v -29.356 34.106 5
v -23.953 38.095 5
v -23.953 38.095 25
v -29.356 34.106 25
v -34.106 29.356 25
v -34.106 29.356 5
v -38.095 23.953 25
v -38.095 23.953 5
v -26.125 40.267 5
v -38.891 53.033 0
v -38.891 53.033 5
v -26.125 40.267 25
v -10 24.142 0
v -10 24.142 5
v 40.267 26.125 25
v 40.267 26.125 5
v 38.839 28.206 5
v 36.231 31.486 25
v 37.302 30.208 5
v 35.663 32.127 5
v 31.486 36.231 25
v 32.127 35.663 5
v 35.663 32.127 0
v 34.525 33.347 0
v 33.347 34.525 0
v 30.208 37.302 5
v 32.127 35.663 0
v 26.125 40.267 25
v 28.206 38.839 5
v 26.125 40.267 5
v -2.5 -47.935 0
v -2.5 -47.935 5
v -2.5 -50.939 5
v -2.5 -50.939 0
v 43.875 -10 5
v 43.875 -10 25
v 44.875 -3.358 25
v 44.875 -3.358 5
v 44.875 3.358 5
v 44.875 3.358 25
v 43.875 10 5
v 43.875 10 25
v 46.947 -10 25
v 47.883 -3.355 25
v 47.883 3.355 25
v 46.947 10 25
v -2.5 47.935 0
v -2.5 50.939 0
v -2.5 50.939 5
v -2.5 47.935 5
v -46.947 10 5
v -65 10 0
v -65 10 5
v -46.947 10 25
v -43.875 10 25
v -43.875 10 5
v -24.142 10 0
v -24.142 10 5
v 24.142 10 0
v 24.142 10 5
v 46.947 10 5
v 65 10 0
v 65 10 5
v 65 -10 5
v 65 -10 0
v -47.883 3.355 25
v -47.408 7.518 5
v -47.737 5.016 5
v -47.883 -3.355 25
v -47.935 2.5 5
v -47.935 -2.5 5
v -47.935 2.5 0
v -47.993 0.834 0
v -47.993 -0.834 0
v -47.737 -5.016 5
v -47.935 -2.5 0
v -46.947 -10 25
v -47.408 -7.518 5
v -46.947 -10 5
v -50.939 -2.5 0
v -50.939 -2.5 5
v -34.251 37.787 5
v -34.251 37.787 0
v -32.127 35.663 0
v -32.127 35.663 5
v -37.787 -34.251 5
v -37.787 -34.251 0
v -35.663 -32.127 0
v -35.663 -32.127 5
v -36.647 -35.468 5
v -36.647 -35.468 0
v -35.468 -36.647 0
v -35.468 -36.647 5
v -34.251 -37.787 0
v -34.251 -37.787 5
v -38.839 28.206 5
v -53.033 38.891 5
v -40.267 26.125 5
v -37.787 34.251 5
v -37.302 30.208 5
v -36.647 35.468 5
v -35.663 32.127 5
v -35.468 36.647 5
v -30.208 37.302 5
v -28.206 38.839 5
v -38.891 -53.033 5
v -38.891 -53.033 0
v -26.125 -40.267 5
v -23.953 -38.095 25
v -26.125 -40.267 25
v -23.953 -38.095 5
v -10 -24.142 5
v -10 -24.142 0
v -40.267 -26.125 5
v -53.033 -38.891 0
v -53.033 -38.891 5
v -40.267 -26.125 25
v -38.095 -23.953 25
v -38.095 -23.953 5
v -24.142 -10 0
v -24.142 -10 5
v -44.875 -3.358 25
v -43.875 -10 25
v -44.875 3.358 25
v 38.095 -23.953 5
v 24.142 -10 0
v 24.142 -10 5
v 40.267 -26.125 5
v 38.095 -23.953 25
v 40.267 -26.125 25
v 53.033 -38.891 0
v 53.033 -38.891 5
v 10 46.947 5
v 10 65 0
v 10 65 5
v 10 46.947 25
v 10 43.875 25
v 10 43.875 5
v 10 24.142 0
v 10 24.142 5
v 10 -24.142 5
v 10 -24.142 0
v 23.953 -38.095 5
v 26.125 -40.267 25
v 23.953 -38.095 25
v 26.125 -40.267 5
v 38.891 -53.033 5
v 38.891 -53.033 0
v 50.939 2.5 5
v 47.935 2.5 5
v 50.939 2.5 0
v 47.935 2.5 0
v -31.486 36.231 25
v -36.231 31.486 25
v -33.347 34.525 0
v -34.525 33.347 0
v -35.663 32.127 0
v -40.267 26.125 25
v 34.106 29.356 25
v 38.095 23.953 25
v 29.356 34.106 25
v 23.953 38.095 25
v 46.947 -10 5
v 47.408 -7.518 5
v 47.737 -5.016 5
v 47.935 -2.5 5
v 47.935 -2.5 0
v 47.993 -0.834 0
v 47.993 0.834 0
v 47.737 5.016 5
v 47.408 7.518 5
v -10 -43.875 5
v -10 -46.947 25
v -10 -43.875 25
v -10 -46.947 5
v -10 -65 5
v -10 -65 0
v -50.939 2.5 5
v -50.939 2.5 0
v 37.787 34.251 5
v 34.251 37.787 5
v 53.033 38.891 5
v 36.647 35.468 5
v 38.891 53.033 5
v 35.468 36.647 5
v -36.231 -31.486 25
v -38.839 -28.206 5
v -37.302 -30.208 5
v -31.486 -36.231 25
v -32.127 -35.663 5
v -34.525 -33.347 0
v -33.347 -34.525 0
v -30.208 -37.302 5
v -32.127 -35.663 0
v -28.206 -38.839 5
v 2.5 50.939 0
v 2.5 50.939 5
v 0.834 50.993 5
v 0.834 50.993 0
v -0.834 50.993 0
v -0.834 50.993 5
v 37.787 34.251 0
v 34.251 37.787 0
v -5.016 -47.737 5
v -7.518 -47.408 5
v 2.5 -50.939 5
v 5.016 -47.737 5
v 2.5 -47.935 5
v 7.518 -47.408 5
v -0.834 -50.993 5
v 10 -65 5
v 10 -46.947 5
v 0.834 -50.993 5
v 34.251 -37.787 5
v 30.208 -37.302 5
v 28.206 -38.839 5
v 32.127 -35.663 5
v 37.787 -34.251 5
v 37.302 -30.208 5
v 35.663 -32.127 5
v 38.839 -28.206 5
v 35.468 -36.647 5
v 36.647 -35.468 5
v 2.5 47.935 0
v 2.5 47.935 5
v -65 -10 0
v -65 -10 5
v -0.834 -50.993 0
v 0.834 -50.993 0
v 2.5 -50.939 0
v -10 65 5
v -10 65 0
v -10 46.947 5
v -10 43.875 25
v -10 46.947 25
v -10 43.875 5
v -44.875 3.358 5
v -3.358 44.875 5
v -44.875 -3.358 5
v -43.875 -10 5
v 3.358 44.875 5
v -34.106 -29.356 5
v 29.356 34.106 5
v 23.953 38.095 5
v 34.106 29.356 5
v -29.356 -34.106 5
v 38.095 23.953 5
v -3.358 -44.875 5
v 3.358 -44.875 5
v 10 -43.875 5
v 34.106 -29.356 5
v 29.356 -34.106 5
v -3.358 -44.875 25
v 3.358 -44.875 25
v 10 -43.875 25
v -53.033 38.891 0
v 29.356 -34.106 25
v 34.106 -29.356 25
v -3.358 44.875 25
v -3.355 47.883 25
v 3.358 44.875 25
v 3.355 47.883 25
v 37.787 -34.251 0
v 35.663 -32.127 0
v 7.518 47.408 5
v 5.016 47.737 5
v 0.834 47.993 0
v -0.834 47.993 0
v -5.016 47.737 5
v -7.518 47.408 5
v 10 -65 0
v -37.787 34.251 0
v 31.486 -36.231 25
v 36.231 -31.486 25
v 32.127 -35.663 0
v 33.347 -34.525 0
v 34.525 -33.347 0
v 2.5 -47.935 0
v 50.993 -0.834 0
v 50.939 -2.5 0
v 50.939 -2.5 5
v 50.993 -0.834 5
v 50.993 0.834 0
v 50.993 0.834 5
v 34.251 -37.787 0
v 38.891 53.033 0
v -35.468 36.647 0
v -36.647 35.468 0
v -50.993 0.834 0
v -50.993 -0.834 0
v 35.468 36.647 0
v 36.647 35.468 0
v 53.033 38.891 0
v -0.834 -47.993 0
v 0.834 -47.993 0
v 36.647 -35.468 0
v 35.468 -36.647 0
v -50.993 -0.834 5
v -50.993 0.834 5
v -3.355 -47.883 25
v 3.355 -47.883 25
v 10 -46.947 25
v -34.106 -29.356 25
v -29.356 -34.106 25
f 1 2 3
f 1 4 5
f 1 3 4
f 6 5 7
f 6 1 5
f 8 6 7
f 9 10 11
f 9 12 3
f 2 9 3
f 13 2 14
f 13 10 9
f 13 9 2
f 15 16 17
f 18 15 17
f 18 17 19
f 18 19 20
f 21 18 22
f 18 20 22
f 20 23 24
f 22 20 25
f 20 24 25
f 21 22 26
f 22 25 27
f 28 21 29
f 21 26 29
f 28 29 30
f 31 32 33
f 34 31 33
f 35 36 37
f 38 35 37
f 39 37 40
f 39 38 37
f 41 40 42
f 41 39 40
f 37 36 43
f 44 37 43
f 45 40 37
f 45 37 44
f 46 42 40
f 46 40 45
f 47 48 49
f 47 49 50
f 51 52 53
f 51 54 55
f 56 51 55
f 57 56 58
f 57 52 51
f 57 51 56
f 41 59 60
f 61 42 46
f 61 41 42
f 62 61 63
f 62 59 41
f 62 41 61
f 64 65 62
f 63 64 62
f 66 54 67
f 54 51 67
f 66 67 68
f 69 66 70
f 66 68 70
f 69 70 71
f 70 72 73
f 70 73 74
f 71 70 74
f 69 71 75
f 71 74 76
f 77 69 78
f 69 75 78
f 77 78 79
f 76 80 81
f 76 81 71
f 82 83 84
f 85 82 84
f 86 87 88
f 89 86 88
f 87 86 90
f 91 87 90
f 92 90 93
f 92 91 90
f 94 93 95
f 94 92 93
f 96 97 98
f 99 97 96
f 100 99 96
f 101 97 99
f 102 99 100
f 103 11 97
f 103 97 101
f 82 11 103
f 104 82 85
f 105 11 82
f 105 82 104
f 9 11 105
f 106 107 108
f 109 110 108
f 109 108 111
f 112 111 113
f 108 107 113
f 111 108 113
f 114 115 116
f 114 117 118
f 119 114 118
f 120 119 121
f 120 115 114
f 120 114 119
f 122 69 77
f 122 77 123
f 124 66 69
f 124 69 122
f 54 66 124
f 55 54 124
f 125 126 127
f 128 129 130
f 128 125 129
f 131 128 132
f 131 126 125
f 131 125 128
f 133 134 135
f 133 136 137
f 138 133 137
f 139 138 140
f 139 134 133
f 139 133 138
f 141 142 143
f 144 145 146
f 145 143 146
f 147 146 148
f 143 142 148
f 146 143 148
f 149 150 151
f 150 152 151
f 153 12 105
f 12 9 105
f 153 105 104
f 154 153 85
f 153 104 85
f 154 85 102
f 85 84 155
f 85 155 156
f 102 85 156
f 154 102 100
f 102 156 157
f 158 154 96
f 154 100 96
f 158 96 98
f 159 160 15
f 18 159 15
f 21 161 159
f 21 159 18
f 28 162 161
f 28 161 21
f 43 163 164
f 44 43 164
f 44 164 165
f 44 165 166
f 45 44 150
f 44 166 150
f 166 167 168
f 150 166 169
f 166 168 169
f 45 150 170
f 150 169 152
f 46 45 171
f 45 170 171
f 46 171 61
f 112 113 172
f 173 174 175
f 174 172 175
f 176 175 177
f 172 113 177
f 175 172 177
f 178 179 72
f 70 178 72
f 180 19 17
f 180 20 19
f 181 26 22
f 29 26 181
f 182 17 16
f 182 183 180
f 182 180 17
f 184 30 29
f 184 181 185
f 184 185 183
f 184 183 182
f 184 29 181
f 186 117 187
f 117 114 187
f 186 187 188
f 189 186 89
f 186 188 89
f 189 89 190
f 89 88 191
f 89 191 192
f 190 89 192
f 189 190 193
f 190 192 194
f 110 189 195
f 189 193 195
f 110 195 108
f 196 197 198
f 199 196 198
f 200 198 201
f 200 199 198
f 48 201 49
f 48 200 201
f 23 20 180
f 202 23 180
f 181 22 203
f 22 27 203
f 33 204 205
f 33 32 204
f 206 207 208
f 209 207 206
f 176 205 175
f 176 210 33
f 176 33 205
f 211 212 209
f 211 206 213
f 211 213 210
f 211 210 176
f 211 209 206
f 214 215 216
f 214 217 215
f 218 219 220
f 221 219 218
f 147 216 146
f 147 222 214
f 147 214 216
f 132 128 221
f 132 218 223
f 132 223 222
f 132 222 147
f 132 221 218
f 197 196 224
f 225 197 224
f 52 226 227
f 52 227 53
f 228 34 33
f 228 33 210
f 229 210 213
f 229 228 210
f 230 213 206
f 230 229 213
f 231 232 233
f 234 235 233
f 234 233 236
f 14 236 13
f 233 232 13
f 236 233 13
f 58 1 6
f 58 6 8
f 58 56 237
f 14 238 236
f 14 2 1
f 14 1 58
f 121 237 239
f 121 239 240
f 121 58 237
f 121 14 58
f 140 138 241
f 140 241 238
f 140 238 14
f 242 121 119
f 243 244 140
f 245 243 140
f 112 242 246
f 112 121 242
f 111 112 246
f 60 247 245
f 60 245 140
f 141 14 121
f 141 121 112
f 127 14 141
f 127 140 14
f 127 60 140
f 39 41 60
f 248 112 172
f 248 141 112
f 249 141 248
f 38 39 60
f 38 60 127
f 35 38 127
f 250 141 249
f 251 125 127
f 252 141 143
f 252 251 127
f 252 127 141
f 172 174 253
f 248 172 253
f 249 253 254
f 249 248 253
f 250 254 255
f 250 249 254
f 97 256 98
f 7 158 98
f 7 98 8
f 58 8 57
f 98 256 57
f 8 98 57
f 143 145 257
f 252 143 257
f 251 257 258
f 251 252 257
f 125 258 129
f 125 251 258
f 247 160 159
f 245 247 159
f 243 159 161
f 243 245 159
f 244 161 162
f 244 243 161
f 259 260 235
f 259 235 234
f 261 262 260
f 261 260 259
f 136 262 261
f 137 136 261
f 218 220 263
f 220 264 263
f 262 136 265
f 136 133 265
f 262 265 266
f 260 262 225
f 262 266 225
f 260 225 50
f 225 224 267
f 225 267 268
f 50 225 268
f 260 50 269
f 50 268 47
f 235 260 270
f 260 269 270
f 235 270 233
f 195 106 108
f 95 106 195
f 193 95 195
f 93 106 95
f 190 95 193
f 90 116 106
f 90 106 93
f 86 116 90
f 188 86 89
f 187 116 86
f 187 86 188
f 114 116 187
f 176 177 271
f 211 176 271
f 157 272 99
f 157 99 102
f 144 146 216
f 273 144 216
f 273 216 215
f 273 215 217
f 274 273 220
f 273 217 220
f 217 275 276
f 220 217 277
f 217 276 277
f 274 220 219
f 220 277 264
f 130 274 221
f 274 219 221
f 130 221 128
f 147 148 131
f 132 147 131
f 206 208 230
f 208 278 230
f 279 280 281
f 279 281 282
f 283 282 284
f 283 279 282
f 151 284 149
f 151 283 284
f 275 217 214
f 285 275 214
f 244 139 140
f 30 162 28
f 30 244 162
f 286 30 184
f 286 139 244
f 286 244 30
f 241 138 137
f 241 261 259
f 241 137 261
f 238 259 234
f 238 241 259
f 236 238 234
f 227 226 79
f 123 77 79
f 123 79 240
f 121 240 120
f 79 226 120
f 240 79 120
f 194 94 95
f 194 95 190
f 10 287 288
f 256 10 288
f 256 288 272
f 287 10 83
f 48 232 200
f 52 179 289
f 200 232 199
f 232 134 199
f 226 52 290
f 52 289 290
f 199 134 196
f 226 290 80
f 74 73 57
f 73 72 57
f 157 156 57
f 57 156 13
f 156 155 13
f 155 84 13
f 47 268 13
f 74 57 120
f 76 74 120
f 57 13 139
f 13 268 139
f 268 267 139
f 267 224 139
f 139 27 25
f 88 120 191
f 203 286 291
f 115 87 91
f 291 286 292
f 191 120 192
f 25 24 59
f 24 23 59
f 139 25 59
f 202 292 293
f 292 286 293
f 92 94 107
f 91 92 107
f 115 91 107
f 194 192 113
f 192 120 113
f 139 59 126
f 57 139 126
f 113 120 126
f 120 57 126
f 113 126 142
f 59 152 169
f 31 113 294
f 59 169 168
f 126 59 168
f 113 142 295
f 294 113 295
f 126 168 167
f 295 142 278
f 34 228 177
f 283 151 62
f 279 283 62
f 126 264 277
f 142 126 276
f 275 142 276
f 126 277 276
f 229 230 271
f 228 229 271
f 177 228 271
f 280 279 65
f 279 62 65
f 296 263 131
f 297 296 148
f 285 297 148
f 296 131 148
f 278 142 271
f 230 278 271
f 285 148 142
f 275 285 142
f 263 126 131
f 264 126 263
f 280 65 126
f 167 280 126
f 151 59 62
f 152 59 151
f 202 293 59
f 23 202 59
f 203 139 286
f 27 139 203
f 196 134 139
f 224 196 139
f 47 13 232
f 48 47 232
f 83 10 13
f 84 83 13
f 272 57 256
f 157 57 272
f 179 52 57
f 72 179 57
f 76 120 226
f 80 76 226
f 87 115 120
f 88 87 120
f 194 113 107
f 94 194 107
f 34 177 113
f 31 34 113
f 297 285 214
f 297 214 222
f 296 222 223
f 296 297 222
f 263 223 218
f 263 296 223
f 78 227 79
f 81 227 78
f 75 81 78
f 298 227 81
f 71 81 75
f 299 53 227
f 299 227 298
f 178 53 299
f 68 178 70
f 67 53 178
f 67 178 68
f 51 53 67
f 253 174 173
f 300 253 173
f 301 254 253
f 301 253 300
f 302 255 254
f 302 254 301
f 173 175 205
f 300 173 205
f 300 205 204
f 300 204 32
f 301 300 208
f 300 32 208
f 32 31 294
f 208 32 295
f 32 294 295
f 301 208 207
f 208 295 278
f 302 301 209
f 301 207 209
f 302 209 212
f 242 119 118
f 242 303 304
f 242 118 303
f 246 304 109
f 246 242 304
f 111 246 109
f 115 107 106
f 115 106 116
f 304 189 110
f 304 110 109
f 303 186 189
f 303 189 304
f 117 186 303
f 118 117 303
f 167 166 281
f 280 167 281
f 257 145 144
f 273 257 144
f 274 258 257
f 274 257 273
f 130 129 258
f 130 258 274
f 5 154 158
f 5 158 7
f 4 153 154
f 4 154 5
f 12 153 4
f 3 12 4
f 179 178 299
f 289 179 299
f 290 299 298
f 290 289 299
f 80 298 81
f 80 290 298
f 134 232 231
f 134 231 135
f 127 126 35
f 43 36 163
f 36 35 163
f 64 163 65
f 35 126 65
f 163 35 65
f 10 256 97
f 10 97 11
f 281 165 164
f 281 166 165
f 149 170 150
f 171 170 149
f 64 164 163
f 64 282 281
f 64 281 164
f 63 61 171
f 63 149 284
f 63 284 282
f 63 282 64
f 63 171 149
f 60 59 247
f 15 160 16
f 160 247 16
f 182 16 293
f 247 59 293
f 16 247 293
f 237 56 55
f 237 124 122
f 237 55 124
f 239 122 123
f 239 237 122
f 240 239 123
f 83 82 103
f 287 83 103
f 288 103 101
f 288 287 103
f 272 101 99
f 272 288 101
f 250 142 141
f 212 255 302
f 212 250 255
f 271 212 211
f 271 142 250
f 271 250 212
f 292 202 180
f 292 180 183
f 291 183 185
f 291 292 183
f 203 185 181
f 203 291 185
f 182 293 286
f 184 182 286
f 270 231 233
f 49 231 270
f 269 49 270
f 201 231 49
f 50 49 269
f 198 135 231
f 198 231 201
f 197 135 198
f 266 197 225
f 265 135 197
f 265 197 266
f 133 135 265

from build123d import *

# Parameters (mm, degrees)
BOX037_W                  = 130
BOX037_H                  = 50
BOX037_DEPTH              = 30
BOX035_W                  = 130
BOX035_H                  = 50
BOX035_DEPTH              = 30
CYLINDER078_R             = 45
CYLINDER078_DEPTH         = 20
CYLINDER077_R             = 48
CYLINDER077_DEPTH         = 20
BOX036_W                  = 130
BOX036_H                  = 60
BOX036_DEPTH              = 20
BOX038_W                  = 130
BOX038_H                  = 60
BOX038_DEPTH              = 20
CYLINDER076_R             = 48
CYLINDER076_DEPTH         = 10
CYLINDER075_R             = 51
CYLINDER075_DEPTH         = 10
BOX034_W                  = 130
BOX034_H                  = 20
BOX034_DEPTH              = 5
CUT049_PLACEMENT_ANGLE    = 270
BOX033_W                  = 130
BOX033_H                  = 50
BOX033_DEPTH              = 30
BOX032_W                  = 130
BOX032_H                  = 50
BOX032_DEPTH              = 30
CYLINDER072_R             = 45
CYLINDER072_DEPTH         = 20
CYLINDER071_R             = 48
CYLINDER071_DEPTH         = 20
BOX031_W                  = 130
BOX031_H                  = 60
BOX031_DEPTH              = 20
BOX030_W                  = 130
BOX030_H                  = 60
BOX030_DEPTH              = 20
CYLINDER073_R             = 48
CYLINDER073_DEPTH         = 10
CYLINDER074_R             = 51
CYLINDER074_DEPTH         = 10
BOX_W                     = 130
BOX_H                     = 20
BOX_DEPTH                 = 5
BOX039_W                  = 130
BOX039_H                  = 50
BOX039_DEPTH              = 30
BOX046_W                  = 130
BOX046_H                  = 50
BOX046_DEPTH              = 30
CYLINDER083_R             = 45
CYLINDER083_DEPTH         = 20
CYLINDER081_R             = 48
CYLINDER081_DEPTH         = 20
BOX042_W                  = 130
BOX042_H                  = 60
BOX042_DEPTH              = 20
BOX048_W                  = 130
BOX048_H                  = 60
BOX048_DEPTH              = 20
CYLINDER080_R             = 48
CYLINDER080_DEPTH         = 10
CYLINDER082_R             = 51
CYLINDER082_DEPTH         = 10
BOX045_W                  = 130
BOX045_H                  = 20
BOX045_DEPTH              = 5
CUT056_PLACEMENT_ANGLE    = 90
BOX044_W                  = 130
BOX044_H                  = 50
BOX044_DEPTH              = 30
BOX041_W                  = 130
BOX041_H                  = 50
BOX041_DEPTH              = 30
CYLINDER086_R             = 45
CYLINDER086_DEPTH         = 20
CYLINDER085_R             = 48
CYLINDER085_DEPTH         = 20
BOX043_W                  = 130
BOX043_H                  = 60
BOX043_DEPTH              = 20
BOX047_W                  = 130
BOX047_H                  = 60
BOX047_DEPTH              = 20
CYLINDER084_R             = 48
CYLINDER084_DEPTH         = 10
CYLINDER079_R             = 51
CYLINDER079_DEPTH         = 10
BOX040_W                  = 130
BOX040_H                  = 20
BOX040_DEPTH              = 5
FUSION030_PLACEMENT_ANGLE = 45


with BuildPart() as cube037:
    # Box037 → Box037 (new body)
    with BuildSketch(Plane(origin=(-65, -60, 0), x_dir=(1, 0, 0), z_dir=(0, 0, 1))):
        with Locations((65, 25)):
            Rectangle(BOX037_W, BOX037_H)
    extrude(amount=BOX037_DEPTH)


with BuildPart() as cube035:
    # Box035 → Box035 (new body)
    with BuildSketch(Plane(origin=(-65, 10, 0), x_dir=(1, 0, 0), z_dir=(0, 0, 1))):
        with Locations((65, 25)):
            Rectangle(BOX035_W, BOX035_H)
    extrude(amount=BOX035_DEPTH)


with BuildPart() as cylinder078:
    # Cylinder078 → Cylinder078 (new body)
    with BuildSketch(Plane.XY):
        Circle(CYLINDER078_R)
    extrude(amount=CYLINDER078_DEPTH)


with BuildPart() as cut044:
    # Cylinder077 → Cylinder077 (new body)
    with BuildSketch(Plane.XY):
        Circle(CYLINDER077_R)
    extrude(amount=CYLINDER077_DEPTH)

    # Cut044: cut Cylinder078
    add(cylinder078.part, mode=Mode.SUBTRACT)


with BuildPart() as cut044_1:
    # Cut044 placement: moved
    add(cut044.part.moved(Location((0, 0, 5))))


with BuildPart() as cube036:
    # Box036 → Box036 (new body)
    with BuildSketch(Plane(origin=(-65, -62.5, -108), x_dir=(1, 0, 0), z_dir=(0, 0, 1))):
        with Locations((65, 30)):
            Rectangle(BOX036_W, BOX036_H)
    extrude(amount=BOX036_DEPTH)


with BuildPart() as cube038:
    # Box038 → Box038 (new body)
    with BuildSketch(Plane(origin=(-65, 2.5, -108), x_dir=(1, 0, 0), z_dir=(0, 0, 1))):
        with Locations((65, 30)):
            Rectangle(BOX038_W, BOX038_H)
    extrude(amount=BOX038_DEPTH)


with BuildPart() as cylinder076:
    # Cylinder076 → Cylinder076 (new body)
    with BuildSketch(Plane.XY):
        Circle(CYLINDER076_R)
    extrude(amount=CYLINDER076_DEPTH)


with BuildPart() as cut046:
    # Cylinder075 → Cylinder075 (new body)
    with BuildSketch(Plane.XY):
        Circle(CYLINDER075_R)
    extrude(amount=CYLINDER075_DEPTH)

    # Cut048: cut Cylinder076
    add(cylinder076.part, mode=Mode.SUBTRACT)


with BuildPart() as cut046_1:
    # Cut048 placement: moved
    add(cut046.part.moved(Location((0, 0, -106))))

    # Cut045: cut Cube038
    add(cube038.part, mode=Mode.SUBTRACT)

    # Cut046: cut Cube036
    add(cube036.part, mode=Mode.SUBTRACT)


with BuildPart() as cut046_2:
    # Cut046 placement: moved
    add(cut046_1.part.moved(Location((0, 0, 105))))


with BuildPart() as cut049:
    # Box034 → Box034 (new body)
    with BuildSketch(Plane(origin=(-65, -10, 0), x_dir=(1, 0, 0), z_dir=(0, 0, 1))):
        with Locations((65, 10)):
            Rectangle(BOX034_W, BOX034_H)
    extrude(amount=BOX034_DEPTH)

    # Cut047: cut Cut046
    add(cut046_2.part, mode=Mode.SUBTRACT)

    # Fusion026: union Cut044
    add(cut044_1.part)

    # Cut050: cut Cube035
    add(cube035.part, mode=Mode.SUBTRACT)

    # Cut049: cut Cube037
    add(cube037.part, mode=Mode.SUBTRACT)


with BuildPart() as cut049_1:
    # Cut049 placement: moved
    add(cut049.part.rotate(Axis((0, 0, 0), (0, 0, 1)), CUT049_PLACEMENT_ANGLE))


with BuildPart() as cube033:
    # Box033 → Box033 (new body)
    with BuildSketch(Plane(origin=(-65, -60, 0), x_dir=(1, 0, 0), z_dir=(0, 0, 1))):
        with Locations((65, 25)):
            Rectangle(BOX033_W, BOX033_H)
    extrude(amount=BOX033_DEPTH)


with BuildPart() as cube032:
    # Box032 → Box032 (new body)
    with BuildSketch(Plane(origin=(-65, 10, 0), x_dir=(1, 0, 0), z_dir=(0, 0, 1))):
        with Locations((65, 25)):
            Rectangle(BOX032_W, BOX032_H)
    extrude(amount=BOX032_DEPTH)


with BuildPart() as cylinder072:
    # Cylinder072 → Cylinder072 (new body)
    with BuildSketch(Plane.XY):
        Circle(CYLINDER072_R)
    extrude(amount=CYLINDER072_DEPTH)


with BuildPart() as cut037:
    # Cylinder071 → Cylinder071 (new body)
    with BuildSketch(Plane.XY):
        Circle(CYLINDER071_R)
    extrude(amount=CYLINDER071_DEPTH)

    # Cut037: cut Cylinder072
    add(cylinder072.part, mode=Mode.SUBTRACT)


with BuildPart() as cut037_1:
    # Cut037 placement: moved
    add(cut037.part.moved(Location((0, 0, 5))))


with BuildPart() as cube031:
    # Box031 → Box031 (new body)
    with BuildSketch(Plane(origin=(-65, -62.5, -108), x_dir=(1, 0, 0), z_dir=(0, 0, 1))):
        with Locations((65, 30)):
            Rectangle(BOX031_W, BOX031_H)
    extrude(amount=BOX031_DEPTH)


with BuildPart() as cube030:
    # Box030 → Box030 (new body)
    with BuildSketch(Plane(origin=(-65, 2.5, -108), x_dir=(1, 0, 0), z_dir=(0, 0, 1))):
        with Locations((65, 30)):
            Rectangle(BOX030_W, BOX030_H)
    extrude(amount=BOX030_DEPTH)


with BuildPart() as cylinder073:
    # Cylinder073 → Cylinder073 (new body)
    with BuildSketch(Plane.XY):
        Circle(CYLINDER073_R)
    extrude(amount=CYLINDER073_DEPTH)


with BuildPart() as cut040:
    # Cylinder074 → Cylinder074 (new body)
    with BuildSketch(Plane.XY):
        Circle(CYLINDER074_R)
    extrude(amount=CYLINDER074_DEPTH)

    # Cut038: cut Cylinder073
    add(cylinder073.part, mode=Mode.SUBTRACT)


with BuildPart() as cut040_1:
    # Cut038 placement: moved
    add(cut040.part.moved(Location((0, 0, -106))))

    # Cut039: cut Cube030
    add(cube030.part, mode=Mode.SUBTRACT)

    # Cut040: cut Cube031
    add(cube031.part, mode=Mode.SUBTRACT)


with BuildPart() as cut040_2:
    # Cut040 placement: moved
    add(cut040_1.part.moved(Location((0, 0, 105))))


with BuildPart() as fusion027:
    # Box → Box (new body)
    with BuildSketch(Plane(origin=(-65, -10, 0), x_dir=(1, 0, 0), z_dir=(0, 0, 1))):
        with Locations((65, 10)):
            Rectangle(BOX_W, BOX_H)
    extrude(amount=BOX_DEPTH)

    # Cut041: cut Cut040
    add(cut040_2.part, mode=Mode.SUBTRACT)

    # Fusion025: union Cut037
    add(cut037_1.part)

    # Cut042: cut Cube032
    add(cube032.part, mode=Mode.SUBTRACT)

    # Cut043: cut Cube033
    add(cube033.part, mode=Mode.SUBTRACT)

    # Fusion027: union Cut049
    add(cut049_1.part)


with BuildPart() as cube039:
    # Box039 → Box039 (new body)
    with BuildSketch(Plane(origin=(-65, -60, 0), x_dir=(1, 0, 0), z_dir=(0, 0, 1))):
        with Locations((65, 25)):
            Rectangle(BOX039_W, BOX039_H)
    extrude(amount=BOX039_DEPTH)


with BuildPart() as cube046:
    # Box046 → Box046 (new body)
    with BuildSketch(Plane(origin=(-65, 10, 0), x_dir=(1, 0, 0), z_dir=(0, 0, 1))):
        with Locations((65, 25)):
            Rectangle(BOX046_W, BOX046_H)
    extrude(amount=BOX046_DEPTH)


with BuildPart() as cylinder083:
    # Cylinder083 → Cylinder083 (new body)
    with BuildSketch(Plane.XY):
        Circle(CYLINDER083_R)
    extrude(amount=CYLINDER083_DEPTH)


with BuildPart() as cut051:
    # Cylinder081 → Cylinder081 (new body)
    with BuildSketch(Plane.XY):
        Circle(CYLINDER081_R)
    extrude(amount=CYLINDER081_DEPTH)

    # Cut051: cut Cylinder083
    add(cylinder083.part, mode=Mode.SUBTRACT)


with BuildPart() as cut051_1:
    # Cut051 placement: moved
    add(cut051.part.moved(Location((0, 0, 5))))


with BuildPart() as cube042:
    # Box042 → Box042 (new body)
    with BuildSketch(Plane(origin=(-65, -62.5, -108), x_dir=(1, 0, 0), z_dir=(0, 0, 1))):
        with Locations((65, 30)):
            Rectangle(BOX042_W, BOX042_H)
    extrude(amount=BOX042_DEPTH)


with BuildPart() as cube048:
    # Box048 → Box048 (new body)
    with BuildSketch(Plane(origin=(-65, 2.5, -108), x_dir=(1, 0, 0), z_dir=(0, 0, 1))):
        with Locations((65, 30)):
            Rectangle(BOX048_W, BOX048_H)
    extrude(amount=BOX048_DEPTH)


with BuildPart() as cylinder080:
    # Cylinder080 → Cylinder080 (new body)
    with BuildSketch(Plane.XY):
        Circle(CYLINDER080_R)
    extrude(amount=CYLINDER080_DEPTH)


with BuildPart() as cut052:
    # Cylinder082 → Cylinder082 (new body)
    with BuildSketch(Plane.XY):
        Circle(CYLINDER082_R)
    extrude(amount=CYLINDER082_DEPTH)

    # Cut055: cut Cylinder080
    add(cylinder080.part, mode=Mode.SUBTRACT)


with BuildPart() as cut052_1:
    # Cut055 placement: moved
    add(cut052.part.moved(Location((0, 0, -106))))

    # Cut053: cut Cube048
    add(cube048.part, mode=Mode.SUBTRACT)

    # Cut052: cut Cube042
    add(cube042.part, mode=Mode.SUBTRACT)


with BuildPart() as cut052_2:
    # Cut052 placement: moved
    add(cut052_1.part.moved(Location((0, 0, 105))))


with BuildPart() as cut056:
    # Box045 → Box045 (new body)
    with BuildSketch(Plane(origin=(-65, -10, 0), x_dir=(1, 0, 0), z_dir=(0, 0, 1))):
        with Locations((65, 10)):
            Rectangle(BOX045_W, BOX045_H)
    extrude(amount=BOX045_DEPTH)

    # Cut054: cut Cut052
    add(cut052_2.part, mode=Mode.SUBTRACT)

    # Fusion029: union Cut051
    add(cut051_1.part)

    # Cut057: cut Cube046
    add(cube046.part, mode=Mode.SUBTRACT)

    # Cut056: cut Cube039
    add(cube039.part, mode=Mode.SUBTRACT)


with BuildPart() as cut056_1:
    # Cut056 placement: moved
    add(cut056.part.rotate(Axis((0, 0, 0), (0, 0, -1)), CUT056_PLACEMENT_ANGLE))


with BuildPart() as cube044:
    # Box044 → Box044 (new body)
    with BuildSketch(Plane(origin=(-65, -60, 0), x_dir=(1, 0, 0), z_dir=(0, 0, 1))):
        with Locations((65, 25)):
            Rectangle(BOX044_W, BOX044_H)
    extrude(amount=BOX044_DEPTH)


with BuildPart() as cube041:
    # Box041 → Box041 (new body)
    with BuildSketch(Plane(origin=(-65, 10, 0), x_dir=(1, 0, 0), z_dir=(0, 0, 1))):
        with Locations((65, 25)):
            Rectangle(BOX041_W, BOX041_H)
    extrude(amount=BOX041_DEPTH)


with BuildPart() as cylinder086:
    # Cylinder086 → Cylinder086 (new body)
    with BuildSketch(Plane.XY):
        Circle(CYLINDER086_R)
    extrude(amount=CYLINDER086_DEPTH)


with BuildPart() as cut058:
    # Cylinder085 → Cylinder085 (new body)
    with BuildSketch(Plane.XY):
        Circle(CYLINDER085_R)
    extrude(amount=CYLINDER085_DEPTH)

    # Cut058: cut Cylinder086
    add(cylinder086.part, mode=Mode.SUBTRACT)


with BuildPart() as cut058_1:
    # Cut058 placement: moved
    add(cut058.part.moved(Location((0, 0, 5))))


with BuildPart() as cube043:
    # Box043 → Box043 (new body)
    with BuildSketch(Plane(origin=(-65, -62.5, -108), x_dir=(1, 0, 0), z_dir=(0, 0, 1))):
        with Locations((65, 30)):
            Rectangle(BOX043_W, BOX043_H)
    extrude(amount=BOX043_DEPTH)


with BuildPart() as cube047:
    # Box047 → Box047 (new body)
    with BuildSketch(Plane(origin=(-65, 2.5, -108), x_dir=(1, 0, 0), z_dir=(0, 0, 1))):
        with Locations((65, 30)):
            Rectangle(BOX047_W, BOX047_H)
    extrude(amount=BOX047_DEPTH)


with BuildPart() as cylinder084:
    # Cylinder084 → Cylinder084 (new body)
    with BuildSketch(Plane.XY):
        Circle(CYLINDER084_R)
    extrude(amount=CYLINDER084_DEPTH)


with BuildPart() as cut060:
    # Cylinder079 → Cylinder079 (new body)
    with BuildSketch(Plane.XY):
        Circle(CYLINDER079_R)
    extrude(amount=CYLINDER079_DEPTH)

    # Cut062: cut Cylinder084
    add(cylinder084.part, mode=Mode.SUBTRACT)


with BuildPart() as cut060_1:
    # Cut062 placement: moved
    add(cut060.part.moved(Location((0, 0, -106))))

    # Cut059: cut Cube047
    add(cube047.part, mode=Mode.SUBTRACT)

    # Cut060: cut Cube043
    add(cube043.part, mode=Mode.SUBTRACT)


with BuildPart() as cut060_2:
    # Cut060 placement: moved
    add(cut060_1.part.moved(Location((0, 0, 105))))


with BuildPart() as medidor:
    # Box040 → Box040 (new body)
    with BuildSketch(Plane(origin=(-65, -10, 0), x_dir=(1, 0, 0), z_dir=(0, 0, 1))):
        with Locations((65, 10)):
            Rectangle(BOX040_W, BOX040_H)
    extrude(amount=BOX040_DEPTH)

    # Cut061: cut Cut060
    add(cut060_2.part, mode=Mode.SUBTRACT)

    # Fusion028: union Cut058
    add(cut058_1.part)

    # Cut064: cut Cube041
    add(cube041.part, mode=Mode.SUBTRACT)

    # Cut063: cut Cube044
    add(cube044.part, mode=Mode.SUBTRACT)

    # Fusion030: union Cut056
    add(cut056_1.part)


with BuildPart() as medidor_1:
    # Fusion030 placement: moved
    add(medidor.part.rotate(Axis((0, 0, 0), (0, 0, 1)), FUSION030_PLACEMENT_ANGLE))

    # Fusion031: union Fusion027
    add(fusion027.part)


solid = medidor_1.part
